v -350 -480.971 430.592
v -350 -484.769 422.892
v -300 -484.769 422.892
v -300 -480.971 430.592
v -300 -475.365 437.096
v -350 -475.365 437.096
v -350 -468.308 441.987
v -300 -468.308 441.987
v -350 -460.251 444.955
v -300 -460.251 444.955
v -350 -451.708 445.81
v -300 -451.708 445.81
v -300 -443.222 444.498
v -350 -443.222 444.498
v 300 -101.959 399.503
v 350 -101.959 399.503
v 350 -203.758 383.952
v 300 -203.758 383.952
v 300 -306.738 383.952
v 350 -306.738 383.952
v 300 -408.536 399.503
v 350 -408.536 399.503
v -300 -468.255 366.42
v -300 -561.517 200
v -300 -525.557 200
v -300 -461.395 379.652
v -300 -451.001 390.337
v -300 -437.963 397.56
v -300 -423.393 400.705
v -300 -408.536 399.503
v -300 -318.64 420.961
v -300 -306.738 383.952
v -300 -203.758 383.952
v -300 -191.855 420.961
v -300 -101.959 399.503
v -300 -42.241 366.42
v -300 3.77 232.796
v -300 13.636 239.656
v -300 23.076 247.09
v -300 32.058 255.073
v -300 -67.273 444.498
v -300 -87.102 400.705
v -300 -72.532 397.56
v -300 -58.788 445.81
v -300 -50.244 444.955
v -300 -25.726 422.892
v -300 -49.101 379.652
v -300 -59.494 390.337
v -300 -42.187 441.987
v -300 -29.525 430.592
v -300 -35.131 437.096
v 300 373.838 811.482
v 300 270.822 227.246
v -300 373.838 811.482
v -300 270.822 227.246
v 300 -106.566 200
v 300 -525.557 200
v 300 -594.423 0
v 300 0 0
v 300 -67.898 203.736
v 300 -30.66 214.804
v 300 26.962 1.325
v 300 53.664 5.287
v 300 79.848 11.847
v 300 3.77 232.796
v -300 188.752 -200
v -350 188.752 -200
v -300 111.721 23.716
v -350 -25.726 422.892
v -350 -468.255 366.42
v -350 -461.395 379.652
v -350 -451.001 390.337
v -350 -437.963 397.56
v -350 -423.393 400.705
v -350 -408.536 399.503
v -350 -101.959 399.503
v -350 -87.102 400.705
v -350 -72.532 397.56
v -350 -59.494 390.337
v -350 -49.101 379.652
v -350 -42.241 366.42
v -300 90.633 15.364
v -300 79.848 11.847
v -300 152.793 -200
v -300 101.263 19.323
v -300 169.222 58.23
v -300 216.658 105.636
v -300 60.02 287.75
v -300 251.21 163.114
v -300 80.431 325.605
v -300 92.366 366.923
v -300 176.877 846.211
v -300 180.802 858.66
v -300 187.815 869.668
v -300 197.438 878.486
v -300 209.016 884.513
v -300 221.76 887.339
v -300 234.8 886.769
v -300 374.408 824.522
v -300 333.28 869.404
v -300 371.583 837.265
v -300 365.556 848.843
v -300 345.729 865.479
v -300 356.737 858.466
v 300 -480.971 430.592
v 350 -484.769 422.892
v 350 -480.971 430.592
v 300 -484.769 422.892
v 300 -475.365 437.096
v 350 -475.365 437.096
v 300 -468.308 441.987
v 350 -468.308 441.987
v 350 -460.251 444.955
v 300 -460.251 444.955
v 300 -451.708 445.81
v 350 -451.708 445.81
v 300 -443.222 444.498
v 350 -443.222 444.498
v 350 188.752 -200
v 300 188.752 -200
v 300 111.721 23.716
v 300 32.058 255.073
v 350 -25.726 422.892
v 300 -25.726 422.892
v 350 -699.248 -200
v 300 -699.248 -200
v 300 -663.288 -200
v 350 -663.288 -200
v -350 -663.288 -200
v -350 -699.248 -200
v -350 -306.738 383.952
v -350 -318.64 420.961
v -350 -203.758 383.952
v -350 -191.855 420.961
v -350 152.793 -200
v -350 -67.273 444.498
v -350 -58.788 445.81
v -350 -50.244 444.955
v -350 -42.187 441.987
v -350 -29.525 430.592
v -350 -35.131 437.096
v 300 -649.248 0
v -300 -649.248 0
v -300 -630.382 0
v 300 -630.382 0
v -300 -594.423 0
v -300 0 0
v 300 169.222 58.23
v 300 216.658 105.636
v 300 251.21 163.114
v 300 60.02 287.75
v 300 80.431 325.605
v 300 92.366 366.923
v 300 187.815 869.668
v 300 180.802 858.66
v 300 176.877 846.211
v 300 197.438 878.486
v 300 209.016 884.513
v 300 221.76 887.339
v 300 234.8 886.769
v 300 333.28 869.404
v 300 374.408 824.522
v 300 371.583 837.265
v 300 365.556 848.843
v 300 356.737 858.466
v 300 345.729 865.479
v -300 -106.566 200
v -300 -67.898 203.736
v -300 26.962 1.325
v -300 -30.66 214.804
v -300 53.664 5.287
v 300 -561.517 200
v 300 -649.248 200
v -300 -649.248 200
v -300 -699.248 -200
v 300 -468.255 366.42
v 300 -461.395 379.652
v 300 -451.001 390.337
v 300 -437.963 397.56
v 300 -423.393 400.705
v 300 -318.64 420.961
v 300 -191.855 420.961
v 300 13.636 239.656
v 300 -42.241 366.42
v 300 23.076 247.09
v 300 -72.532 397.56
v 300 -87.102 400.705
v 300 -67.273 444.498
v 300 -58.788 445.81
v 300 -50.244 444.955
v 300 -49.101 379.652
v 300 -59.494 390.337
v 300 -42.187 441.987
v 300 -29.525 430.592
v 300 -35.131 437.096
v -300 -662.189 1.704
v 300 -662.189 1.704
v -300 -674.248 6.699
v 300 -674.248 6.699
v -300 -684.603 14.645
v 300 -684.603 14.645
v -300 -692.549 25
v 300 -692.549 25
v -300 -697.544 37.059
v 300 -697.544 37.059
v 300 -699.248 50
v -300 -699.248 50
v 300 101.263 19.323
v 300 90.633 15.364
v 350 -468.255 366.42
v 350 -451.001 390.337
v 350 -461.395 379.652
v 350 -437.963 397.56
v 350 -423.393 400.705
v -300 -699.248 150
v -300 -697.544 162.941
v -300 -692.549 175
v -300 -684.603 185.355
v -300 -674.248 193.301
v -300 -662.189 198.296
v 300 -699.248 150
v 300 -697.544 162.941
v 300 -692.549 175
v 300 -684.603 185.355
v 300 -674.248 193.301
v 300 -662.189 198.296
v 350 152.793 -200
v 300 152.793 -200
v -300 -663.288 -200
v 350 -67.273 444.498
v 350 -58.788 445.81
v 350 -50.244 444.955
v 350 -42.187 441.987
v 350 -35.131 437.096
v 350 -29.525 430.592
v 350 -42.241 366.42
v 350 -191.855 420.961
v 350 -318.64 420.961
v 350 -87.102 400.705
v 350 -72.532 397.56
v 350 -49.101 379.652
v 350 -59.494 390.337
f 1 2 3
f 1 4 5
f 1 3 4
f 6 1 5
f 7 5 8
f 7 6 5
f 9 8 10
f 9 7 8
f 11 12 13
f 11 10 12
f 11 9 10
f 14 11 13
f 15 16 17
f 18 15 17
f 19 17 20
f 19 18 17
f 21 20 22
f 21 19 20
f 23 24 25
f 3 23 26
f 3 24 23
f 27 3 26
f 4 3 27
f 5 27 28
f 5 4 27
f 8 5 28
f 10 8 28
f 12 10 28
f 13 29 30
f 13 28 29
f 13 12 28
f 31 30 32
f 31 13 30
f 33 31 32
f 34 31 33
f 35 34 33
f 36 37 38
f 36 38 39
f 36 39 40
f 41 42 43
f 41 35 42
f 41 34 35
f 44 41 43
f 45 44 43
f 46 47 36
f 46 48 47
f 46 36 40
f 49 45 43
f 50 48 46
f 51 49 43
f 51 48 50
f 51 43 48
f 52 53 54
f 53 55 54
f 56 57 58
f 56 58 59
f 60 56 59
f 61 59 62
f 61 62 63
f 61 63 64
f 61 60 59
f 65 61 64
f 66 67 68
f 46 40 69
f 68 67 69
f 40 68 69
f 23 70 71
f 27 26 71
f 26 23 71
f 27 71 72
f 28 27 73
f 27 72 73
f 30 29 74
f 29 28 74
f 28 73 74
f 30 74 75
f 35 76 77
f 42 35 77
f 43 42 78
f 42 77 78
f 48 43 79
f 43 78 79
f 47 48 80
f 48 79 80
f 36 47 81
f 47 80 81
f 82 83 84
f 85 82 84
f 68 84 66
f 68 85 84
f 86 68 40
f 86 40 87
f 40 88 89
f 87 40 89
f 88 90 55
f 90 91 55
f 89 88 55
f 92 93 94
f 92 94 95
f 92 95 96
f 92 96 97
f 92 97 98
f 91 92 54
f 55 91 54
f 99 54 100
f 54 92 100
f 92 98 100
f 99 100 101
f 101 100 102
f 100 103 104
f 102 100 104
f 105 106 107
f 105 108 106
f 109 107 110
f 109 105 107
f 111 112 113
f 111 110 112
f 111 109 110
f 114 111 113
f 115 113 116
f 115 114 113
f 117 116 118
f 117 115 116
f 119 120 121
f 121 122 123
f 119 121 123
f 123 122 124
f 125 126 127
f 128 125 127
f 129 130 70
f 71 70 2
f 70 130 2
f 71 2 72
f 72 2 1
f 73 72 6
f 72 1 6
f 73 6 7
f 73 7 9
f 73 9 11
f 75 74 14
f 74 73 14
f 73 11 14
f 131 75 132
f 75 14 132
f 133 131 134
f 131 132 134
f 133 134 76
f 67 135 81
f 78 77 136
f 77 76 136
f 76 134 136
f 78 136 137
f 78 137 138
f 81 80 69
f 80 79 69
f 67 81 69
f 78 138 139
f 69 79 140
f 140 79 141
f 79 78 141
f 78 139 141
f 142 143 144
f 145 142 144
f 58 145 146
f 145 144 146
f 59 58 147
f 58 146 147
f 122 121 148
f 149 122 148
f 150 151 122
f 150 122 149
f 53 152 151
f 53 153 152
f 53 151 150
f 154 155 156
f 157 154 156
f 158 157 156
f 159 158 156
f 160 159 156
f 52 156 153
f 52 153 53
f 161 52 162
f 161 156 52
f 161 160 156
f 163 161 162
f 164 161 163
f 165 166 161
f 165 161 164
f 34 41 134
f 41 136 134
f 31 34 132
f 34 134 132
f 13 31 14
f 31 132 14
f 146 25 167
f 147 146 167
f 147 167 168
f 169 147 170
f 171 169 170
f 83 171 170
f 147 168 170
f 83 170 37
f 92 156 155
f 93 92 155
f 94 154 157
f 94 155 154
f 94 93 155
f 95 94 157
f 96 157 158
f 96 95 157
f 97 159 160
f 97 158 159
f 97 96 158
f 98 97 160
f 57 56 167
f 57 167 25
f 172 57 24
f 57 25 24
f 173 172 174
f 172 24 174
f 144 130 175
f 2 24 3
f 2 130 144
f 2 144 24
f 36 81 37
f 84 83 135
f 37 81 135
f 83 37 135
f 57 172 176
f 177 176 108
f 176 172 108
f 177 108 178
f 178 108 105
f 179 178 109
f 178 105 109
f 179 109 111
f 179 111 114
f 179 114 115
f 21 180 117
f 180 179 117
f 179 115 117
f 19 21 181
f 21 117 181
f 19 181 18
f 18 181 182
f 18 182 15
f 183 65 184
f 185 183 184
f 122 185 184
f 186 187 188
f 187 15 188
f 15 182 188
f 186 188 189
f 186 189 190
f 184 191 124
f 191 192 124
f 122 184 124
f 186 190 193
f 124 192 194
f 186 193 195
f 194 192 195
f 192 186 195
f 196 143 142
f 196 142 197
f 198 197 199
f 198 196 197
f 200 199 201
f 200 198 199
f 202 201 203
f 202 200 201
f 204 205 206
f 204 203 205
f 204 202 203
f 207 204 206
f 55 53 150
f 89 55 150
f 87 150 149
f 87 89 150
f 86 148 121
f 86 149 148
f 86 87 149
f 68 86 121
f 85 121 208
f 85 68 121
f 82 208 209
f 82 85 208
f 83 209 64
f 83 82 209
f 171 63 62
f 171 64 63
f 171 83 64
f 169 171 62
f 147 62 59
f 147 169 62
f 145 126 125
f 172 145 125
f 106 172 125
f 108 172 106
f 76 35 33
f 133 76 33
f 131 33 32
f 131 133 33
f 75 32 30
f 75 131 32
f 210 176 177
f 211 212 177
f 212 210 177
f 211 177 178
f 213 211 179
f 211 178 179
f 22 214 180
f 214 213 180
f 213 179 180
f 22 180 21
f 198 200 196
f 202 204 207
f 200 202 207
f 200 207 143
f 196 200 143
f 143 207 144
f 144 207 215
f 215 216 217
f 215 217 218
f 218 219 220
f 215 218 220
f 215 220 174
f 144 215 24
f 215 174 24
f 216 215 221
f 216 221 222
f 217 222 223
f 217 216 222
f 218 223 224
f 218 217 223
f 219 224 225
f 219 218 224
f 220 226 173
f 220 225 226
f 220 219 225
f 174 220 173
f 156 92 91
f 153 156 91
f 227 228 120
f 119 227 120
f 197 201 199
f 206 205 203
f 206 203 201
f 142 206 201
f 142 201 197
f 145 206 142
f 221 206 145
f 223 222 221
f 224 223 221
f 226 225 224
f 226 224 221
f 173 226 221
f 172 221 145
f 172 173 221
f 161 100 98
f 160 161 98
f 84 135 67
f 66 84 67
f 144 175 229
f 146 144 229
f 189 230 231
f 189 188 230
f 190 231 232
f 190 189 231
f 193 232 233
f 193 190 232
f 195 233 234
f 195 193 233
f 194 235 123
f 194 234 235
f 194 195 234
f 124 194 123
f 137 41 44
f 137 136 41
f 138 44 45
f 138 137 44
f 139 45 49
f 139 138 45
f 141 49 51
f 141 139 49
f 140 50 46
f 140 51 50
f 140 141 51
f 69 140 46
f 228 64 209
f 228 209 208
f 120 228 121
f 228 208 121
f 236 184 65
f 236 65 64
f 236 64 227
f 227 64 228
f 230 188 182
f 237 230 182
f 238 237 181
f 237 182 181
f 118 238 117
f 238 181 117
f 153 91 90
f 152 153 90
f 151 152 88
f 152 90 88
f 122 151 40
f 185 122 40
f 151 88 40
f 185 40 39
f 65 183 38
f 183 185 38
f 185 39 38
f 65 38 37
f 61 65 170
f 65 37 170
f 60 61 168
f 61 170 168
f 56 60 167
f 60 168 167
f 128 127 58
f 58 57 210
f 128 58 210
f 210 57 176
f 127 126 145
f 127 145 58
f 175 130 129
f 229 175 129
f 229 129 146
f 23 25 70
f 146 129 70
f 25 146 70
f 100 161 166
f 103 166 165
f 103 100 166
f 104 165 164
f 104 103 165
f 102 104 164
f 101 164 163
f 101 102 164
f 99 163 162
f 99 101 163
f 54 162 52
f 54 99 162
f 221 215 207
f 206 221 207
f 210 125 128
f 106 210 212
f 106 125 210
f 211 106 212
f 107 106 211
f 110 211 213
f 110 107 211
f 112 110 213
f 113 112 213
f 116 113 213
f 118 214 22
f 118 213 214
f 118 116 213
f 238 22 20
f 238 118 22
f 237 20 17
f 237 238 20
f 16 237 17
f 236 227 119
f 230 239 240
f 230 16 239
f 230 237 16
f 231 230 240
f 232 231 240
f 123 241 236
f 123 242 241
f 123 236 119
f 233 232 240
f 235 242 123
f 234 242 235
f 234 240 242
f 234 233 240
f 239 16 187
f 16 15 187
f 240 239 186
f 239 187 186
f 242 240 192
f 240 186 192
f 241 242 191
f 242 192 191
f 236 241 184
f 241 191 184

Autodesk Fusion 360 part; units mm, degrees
sketch "草图1" plane through (0, 0, 0) normal (1, 0, 0) x (0, 1, 0)
  line L0 (-649.2476, 0) -> (0, 0)
  arc A0 (0, 0) -> (270.8221, 227.2465) centre (0, 275) ccw
  line L1 (270.8221, 227.2465) -> (373.8385, 811.4816)
  arc A1 (373.8385, 811.4816) -> (333.2805, 869.4044) centre (324.5981, 820.164) ccw
  line L2 (333.2805, 869.4044) -> (234.7997, 886.7692)
  arc A2 (234.7997, 886.7692) -> (176.8769, 846.2112) centre (226.1173, 837.5288) ccw
  line L3 (176.8769, 846.2112) -> (92.3655, 366.9231)
  arc A3 (-106.5657, 200) -> (92.3655, 366.9231) centre (-106.5657, 402) ccw
  line L4 (-106.5657, 200) -> (-649.2476, 200)
  arc A4 (-649.2476, 200) -> (-699.2476, 150) centre (-649.2476, 150) ccw
  line L5 (-699.2476, 150) -> (-699.2476, 50)
  arc A5 (-699.2476, 50) -> (-649.2476, 0) centre (-649.2476, 50) ccw
  line L6 (-130, 0) -> (100, 0) construction
  line L7 (373.8385, 811.4816) -> (230.7524, 0) construction
  dimension "d1" = 200
  dimension "d2" = 50
  dimension "d3" = 50
  dimension "d4" = 100
  dimension "d5" = 930
  dimension "d6" = 874
  dimension "d7" = 50
  dimension "d8" = 50
  dimension "d9" = 275
  dimension "d10" = 202
  dimension "d11" = 200
extrude "拉伸1" add sketch "草图1" along normal mid plane 600 makes body 1
sketch "草图2" plane through (300, 0, 0) normal (1, 0, 0) x (0, 1, 0)
  line L0 (-1000, 0) -> (500, 0) construction
  line L1 (-255.2476, 500) -> (-255.2476, -500) construction
  line L2 (-699.2476, 150) -> (-699.2476, 50)
  line L3 (-699.2476, -200) -> (-663.2885, -200)
  line L4 (-663.2885, -200) -> (-468.2546, 366.4195)
  line L5 (-699.2476, -200) -> (-484.7688, 422.8917)
  arc A0 (-443.2224, 444.4975) -> (-484.7688, 422.8917) centre (-452.6211, 411.8224) ccw
  arc A1 (-408.5365, 399.5028) -> (-468.2546, 366.4195) centre (-420.0332, 349.8155) ccw
  arc A2 (-408.5365, 399.5028) -> (-101.9587, 399.5028) centre (-255.2476, 1062) ccw
  arc A3 (-443.2224, 444.4975) -> (-67.2728, 444.4975) centre (-255.2476, 1098) ccw
  arc A4 (-25.7264, 422.8917) -> (-67.2728, 444.4975) centre (-57.8741, 411.8224) ccw
  arc A5 (-42.2406, 366.4195) -> (-101.9587, 399.5028) centre (-90.462, 349.8155) ccw
  line L6 (-42.2406, 366.4195) -> (152.7933, -200)
  line L7 (152.7933, -200) -> (188.7524, -200)
  line L8 (188.7524, -200) -> (-25.7264, 422.8917)
  line L9 (-255.2476, 500) -> (-255.2476, 524.2021) construction
  line L10 (-255.2476, 524.2021) -> (-255.2476, 850) construction
  dimension "d16" = 444
  dimension "d17" = 34
  dimension "d18" = 888
  dimension "d19" = 34
  dimension "d20" = 34
  dimension "d21" = 680
  dimension "d22" = 51
  dimension "d23" = 51
  dimension "d24" = 36
  dimension "d25" = 38
  dimension "d26" = 200
  dimension "d27" = 418
  dimension "d28" = 680
extrude "拉伸2" add sketch "草图2" along normal blind 50 separate body makes body 2
copy_body "复制和粘贴实体1" bodies 2 makes body 3
move_body "移动1" bodies 3 to x (1, 0, 0) y (0, 1, 0) z (0, 0, 1) at (-650, 0, 0)
combine "合并1" operation add target body 1 tool bodies 3 2
